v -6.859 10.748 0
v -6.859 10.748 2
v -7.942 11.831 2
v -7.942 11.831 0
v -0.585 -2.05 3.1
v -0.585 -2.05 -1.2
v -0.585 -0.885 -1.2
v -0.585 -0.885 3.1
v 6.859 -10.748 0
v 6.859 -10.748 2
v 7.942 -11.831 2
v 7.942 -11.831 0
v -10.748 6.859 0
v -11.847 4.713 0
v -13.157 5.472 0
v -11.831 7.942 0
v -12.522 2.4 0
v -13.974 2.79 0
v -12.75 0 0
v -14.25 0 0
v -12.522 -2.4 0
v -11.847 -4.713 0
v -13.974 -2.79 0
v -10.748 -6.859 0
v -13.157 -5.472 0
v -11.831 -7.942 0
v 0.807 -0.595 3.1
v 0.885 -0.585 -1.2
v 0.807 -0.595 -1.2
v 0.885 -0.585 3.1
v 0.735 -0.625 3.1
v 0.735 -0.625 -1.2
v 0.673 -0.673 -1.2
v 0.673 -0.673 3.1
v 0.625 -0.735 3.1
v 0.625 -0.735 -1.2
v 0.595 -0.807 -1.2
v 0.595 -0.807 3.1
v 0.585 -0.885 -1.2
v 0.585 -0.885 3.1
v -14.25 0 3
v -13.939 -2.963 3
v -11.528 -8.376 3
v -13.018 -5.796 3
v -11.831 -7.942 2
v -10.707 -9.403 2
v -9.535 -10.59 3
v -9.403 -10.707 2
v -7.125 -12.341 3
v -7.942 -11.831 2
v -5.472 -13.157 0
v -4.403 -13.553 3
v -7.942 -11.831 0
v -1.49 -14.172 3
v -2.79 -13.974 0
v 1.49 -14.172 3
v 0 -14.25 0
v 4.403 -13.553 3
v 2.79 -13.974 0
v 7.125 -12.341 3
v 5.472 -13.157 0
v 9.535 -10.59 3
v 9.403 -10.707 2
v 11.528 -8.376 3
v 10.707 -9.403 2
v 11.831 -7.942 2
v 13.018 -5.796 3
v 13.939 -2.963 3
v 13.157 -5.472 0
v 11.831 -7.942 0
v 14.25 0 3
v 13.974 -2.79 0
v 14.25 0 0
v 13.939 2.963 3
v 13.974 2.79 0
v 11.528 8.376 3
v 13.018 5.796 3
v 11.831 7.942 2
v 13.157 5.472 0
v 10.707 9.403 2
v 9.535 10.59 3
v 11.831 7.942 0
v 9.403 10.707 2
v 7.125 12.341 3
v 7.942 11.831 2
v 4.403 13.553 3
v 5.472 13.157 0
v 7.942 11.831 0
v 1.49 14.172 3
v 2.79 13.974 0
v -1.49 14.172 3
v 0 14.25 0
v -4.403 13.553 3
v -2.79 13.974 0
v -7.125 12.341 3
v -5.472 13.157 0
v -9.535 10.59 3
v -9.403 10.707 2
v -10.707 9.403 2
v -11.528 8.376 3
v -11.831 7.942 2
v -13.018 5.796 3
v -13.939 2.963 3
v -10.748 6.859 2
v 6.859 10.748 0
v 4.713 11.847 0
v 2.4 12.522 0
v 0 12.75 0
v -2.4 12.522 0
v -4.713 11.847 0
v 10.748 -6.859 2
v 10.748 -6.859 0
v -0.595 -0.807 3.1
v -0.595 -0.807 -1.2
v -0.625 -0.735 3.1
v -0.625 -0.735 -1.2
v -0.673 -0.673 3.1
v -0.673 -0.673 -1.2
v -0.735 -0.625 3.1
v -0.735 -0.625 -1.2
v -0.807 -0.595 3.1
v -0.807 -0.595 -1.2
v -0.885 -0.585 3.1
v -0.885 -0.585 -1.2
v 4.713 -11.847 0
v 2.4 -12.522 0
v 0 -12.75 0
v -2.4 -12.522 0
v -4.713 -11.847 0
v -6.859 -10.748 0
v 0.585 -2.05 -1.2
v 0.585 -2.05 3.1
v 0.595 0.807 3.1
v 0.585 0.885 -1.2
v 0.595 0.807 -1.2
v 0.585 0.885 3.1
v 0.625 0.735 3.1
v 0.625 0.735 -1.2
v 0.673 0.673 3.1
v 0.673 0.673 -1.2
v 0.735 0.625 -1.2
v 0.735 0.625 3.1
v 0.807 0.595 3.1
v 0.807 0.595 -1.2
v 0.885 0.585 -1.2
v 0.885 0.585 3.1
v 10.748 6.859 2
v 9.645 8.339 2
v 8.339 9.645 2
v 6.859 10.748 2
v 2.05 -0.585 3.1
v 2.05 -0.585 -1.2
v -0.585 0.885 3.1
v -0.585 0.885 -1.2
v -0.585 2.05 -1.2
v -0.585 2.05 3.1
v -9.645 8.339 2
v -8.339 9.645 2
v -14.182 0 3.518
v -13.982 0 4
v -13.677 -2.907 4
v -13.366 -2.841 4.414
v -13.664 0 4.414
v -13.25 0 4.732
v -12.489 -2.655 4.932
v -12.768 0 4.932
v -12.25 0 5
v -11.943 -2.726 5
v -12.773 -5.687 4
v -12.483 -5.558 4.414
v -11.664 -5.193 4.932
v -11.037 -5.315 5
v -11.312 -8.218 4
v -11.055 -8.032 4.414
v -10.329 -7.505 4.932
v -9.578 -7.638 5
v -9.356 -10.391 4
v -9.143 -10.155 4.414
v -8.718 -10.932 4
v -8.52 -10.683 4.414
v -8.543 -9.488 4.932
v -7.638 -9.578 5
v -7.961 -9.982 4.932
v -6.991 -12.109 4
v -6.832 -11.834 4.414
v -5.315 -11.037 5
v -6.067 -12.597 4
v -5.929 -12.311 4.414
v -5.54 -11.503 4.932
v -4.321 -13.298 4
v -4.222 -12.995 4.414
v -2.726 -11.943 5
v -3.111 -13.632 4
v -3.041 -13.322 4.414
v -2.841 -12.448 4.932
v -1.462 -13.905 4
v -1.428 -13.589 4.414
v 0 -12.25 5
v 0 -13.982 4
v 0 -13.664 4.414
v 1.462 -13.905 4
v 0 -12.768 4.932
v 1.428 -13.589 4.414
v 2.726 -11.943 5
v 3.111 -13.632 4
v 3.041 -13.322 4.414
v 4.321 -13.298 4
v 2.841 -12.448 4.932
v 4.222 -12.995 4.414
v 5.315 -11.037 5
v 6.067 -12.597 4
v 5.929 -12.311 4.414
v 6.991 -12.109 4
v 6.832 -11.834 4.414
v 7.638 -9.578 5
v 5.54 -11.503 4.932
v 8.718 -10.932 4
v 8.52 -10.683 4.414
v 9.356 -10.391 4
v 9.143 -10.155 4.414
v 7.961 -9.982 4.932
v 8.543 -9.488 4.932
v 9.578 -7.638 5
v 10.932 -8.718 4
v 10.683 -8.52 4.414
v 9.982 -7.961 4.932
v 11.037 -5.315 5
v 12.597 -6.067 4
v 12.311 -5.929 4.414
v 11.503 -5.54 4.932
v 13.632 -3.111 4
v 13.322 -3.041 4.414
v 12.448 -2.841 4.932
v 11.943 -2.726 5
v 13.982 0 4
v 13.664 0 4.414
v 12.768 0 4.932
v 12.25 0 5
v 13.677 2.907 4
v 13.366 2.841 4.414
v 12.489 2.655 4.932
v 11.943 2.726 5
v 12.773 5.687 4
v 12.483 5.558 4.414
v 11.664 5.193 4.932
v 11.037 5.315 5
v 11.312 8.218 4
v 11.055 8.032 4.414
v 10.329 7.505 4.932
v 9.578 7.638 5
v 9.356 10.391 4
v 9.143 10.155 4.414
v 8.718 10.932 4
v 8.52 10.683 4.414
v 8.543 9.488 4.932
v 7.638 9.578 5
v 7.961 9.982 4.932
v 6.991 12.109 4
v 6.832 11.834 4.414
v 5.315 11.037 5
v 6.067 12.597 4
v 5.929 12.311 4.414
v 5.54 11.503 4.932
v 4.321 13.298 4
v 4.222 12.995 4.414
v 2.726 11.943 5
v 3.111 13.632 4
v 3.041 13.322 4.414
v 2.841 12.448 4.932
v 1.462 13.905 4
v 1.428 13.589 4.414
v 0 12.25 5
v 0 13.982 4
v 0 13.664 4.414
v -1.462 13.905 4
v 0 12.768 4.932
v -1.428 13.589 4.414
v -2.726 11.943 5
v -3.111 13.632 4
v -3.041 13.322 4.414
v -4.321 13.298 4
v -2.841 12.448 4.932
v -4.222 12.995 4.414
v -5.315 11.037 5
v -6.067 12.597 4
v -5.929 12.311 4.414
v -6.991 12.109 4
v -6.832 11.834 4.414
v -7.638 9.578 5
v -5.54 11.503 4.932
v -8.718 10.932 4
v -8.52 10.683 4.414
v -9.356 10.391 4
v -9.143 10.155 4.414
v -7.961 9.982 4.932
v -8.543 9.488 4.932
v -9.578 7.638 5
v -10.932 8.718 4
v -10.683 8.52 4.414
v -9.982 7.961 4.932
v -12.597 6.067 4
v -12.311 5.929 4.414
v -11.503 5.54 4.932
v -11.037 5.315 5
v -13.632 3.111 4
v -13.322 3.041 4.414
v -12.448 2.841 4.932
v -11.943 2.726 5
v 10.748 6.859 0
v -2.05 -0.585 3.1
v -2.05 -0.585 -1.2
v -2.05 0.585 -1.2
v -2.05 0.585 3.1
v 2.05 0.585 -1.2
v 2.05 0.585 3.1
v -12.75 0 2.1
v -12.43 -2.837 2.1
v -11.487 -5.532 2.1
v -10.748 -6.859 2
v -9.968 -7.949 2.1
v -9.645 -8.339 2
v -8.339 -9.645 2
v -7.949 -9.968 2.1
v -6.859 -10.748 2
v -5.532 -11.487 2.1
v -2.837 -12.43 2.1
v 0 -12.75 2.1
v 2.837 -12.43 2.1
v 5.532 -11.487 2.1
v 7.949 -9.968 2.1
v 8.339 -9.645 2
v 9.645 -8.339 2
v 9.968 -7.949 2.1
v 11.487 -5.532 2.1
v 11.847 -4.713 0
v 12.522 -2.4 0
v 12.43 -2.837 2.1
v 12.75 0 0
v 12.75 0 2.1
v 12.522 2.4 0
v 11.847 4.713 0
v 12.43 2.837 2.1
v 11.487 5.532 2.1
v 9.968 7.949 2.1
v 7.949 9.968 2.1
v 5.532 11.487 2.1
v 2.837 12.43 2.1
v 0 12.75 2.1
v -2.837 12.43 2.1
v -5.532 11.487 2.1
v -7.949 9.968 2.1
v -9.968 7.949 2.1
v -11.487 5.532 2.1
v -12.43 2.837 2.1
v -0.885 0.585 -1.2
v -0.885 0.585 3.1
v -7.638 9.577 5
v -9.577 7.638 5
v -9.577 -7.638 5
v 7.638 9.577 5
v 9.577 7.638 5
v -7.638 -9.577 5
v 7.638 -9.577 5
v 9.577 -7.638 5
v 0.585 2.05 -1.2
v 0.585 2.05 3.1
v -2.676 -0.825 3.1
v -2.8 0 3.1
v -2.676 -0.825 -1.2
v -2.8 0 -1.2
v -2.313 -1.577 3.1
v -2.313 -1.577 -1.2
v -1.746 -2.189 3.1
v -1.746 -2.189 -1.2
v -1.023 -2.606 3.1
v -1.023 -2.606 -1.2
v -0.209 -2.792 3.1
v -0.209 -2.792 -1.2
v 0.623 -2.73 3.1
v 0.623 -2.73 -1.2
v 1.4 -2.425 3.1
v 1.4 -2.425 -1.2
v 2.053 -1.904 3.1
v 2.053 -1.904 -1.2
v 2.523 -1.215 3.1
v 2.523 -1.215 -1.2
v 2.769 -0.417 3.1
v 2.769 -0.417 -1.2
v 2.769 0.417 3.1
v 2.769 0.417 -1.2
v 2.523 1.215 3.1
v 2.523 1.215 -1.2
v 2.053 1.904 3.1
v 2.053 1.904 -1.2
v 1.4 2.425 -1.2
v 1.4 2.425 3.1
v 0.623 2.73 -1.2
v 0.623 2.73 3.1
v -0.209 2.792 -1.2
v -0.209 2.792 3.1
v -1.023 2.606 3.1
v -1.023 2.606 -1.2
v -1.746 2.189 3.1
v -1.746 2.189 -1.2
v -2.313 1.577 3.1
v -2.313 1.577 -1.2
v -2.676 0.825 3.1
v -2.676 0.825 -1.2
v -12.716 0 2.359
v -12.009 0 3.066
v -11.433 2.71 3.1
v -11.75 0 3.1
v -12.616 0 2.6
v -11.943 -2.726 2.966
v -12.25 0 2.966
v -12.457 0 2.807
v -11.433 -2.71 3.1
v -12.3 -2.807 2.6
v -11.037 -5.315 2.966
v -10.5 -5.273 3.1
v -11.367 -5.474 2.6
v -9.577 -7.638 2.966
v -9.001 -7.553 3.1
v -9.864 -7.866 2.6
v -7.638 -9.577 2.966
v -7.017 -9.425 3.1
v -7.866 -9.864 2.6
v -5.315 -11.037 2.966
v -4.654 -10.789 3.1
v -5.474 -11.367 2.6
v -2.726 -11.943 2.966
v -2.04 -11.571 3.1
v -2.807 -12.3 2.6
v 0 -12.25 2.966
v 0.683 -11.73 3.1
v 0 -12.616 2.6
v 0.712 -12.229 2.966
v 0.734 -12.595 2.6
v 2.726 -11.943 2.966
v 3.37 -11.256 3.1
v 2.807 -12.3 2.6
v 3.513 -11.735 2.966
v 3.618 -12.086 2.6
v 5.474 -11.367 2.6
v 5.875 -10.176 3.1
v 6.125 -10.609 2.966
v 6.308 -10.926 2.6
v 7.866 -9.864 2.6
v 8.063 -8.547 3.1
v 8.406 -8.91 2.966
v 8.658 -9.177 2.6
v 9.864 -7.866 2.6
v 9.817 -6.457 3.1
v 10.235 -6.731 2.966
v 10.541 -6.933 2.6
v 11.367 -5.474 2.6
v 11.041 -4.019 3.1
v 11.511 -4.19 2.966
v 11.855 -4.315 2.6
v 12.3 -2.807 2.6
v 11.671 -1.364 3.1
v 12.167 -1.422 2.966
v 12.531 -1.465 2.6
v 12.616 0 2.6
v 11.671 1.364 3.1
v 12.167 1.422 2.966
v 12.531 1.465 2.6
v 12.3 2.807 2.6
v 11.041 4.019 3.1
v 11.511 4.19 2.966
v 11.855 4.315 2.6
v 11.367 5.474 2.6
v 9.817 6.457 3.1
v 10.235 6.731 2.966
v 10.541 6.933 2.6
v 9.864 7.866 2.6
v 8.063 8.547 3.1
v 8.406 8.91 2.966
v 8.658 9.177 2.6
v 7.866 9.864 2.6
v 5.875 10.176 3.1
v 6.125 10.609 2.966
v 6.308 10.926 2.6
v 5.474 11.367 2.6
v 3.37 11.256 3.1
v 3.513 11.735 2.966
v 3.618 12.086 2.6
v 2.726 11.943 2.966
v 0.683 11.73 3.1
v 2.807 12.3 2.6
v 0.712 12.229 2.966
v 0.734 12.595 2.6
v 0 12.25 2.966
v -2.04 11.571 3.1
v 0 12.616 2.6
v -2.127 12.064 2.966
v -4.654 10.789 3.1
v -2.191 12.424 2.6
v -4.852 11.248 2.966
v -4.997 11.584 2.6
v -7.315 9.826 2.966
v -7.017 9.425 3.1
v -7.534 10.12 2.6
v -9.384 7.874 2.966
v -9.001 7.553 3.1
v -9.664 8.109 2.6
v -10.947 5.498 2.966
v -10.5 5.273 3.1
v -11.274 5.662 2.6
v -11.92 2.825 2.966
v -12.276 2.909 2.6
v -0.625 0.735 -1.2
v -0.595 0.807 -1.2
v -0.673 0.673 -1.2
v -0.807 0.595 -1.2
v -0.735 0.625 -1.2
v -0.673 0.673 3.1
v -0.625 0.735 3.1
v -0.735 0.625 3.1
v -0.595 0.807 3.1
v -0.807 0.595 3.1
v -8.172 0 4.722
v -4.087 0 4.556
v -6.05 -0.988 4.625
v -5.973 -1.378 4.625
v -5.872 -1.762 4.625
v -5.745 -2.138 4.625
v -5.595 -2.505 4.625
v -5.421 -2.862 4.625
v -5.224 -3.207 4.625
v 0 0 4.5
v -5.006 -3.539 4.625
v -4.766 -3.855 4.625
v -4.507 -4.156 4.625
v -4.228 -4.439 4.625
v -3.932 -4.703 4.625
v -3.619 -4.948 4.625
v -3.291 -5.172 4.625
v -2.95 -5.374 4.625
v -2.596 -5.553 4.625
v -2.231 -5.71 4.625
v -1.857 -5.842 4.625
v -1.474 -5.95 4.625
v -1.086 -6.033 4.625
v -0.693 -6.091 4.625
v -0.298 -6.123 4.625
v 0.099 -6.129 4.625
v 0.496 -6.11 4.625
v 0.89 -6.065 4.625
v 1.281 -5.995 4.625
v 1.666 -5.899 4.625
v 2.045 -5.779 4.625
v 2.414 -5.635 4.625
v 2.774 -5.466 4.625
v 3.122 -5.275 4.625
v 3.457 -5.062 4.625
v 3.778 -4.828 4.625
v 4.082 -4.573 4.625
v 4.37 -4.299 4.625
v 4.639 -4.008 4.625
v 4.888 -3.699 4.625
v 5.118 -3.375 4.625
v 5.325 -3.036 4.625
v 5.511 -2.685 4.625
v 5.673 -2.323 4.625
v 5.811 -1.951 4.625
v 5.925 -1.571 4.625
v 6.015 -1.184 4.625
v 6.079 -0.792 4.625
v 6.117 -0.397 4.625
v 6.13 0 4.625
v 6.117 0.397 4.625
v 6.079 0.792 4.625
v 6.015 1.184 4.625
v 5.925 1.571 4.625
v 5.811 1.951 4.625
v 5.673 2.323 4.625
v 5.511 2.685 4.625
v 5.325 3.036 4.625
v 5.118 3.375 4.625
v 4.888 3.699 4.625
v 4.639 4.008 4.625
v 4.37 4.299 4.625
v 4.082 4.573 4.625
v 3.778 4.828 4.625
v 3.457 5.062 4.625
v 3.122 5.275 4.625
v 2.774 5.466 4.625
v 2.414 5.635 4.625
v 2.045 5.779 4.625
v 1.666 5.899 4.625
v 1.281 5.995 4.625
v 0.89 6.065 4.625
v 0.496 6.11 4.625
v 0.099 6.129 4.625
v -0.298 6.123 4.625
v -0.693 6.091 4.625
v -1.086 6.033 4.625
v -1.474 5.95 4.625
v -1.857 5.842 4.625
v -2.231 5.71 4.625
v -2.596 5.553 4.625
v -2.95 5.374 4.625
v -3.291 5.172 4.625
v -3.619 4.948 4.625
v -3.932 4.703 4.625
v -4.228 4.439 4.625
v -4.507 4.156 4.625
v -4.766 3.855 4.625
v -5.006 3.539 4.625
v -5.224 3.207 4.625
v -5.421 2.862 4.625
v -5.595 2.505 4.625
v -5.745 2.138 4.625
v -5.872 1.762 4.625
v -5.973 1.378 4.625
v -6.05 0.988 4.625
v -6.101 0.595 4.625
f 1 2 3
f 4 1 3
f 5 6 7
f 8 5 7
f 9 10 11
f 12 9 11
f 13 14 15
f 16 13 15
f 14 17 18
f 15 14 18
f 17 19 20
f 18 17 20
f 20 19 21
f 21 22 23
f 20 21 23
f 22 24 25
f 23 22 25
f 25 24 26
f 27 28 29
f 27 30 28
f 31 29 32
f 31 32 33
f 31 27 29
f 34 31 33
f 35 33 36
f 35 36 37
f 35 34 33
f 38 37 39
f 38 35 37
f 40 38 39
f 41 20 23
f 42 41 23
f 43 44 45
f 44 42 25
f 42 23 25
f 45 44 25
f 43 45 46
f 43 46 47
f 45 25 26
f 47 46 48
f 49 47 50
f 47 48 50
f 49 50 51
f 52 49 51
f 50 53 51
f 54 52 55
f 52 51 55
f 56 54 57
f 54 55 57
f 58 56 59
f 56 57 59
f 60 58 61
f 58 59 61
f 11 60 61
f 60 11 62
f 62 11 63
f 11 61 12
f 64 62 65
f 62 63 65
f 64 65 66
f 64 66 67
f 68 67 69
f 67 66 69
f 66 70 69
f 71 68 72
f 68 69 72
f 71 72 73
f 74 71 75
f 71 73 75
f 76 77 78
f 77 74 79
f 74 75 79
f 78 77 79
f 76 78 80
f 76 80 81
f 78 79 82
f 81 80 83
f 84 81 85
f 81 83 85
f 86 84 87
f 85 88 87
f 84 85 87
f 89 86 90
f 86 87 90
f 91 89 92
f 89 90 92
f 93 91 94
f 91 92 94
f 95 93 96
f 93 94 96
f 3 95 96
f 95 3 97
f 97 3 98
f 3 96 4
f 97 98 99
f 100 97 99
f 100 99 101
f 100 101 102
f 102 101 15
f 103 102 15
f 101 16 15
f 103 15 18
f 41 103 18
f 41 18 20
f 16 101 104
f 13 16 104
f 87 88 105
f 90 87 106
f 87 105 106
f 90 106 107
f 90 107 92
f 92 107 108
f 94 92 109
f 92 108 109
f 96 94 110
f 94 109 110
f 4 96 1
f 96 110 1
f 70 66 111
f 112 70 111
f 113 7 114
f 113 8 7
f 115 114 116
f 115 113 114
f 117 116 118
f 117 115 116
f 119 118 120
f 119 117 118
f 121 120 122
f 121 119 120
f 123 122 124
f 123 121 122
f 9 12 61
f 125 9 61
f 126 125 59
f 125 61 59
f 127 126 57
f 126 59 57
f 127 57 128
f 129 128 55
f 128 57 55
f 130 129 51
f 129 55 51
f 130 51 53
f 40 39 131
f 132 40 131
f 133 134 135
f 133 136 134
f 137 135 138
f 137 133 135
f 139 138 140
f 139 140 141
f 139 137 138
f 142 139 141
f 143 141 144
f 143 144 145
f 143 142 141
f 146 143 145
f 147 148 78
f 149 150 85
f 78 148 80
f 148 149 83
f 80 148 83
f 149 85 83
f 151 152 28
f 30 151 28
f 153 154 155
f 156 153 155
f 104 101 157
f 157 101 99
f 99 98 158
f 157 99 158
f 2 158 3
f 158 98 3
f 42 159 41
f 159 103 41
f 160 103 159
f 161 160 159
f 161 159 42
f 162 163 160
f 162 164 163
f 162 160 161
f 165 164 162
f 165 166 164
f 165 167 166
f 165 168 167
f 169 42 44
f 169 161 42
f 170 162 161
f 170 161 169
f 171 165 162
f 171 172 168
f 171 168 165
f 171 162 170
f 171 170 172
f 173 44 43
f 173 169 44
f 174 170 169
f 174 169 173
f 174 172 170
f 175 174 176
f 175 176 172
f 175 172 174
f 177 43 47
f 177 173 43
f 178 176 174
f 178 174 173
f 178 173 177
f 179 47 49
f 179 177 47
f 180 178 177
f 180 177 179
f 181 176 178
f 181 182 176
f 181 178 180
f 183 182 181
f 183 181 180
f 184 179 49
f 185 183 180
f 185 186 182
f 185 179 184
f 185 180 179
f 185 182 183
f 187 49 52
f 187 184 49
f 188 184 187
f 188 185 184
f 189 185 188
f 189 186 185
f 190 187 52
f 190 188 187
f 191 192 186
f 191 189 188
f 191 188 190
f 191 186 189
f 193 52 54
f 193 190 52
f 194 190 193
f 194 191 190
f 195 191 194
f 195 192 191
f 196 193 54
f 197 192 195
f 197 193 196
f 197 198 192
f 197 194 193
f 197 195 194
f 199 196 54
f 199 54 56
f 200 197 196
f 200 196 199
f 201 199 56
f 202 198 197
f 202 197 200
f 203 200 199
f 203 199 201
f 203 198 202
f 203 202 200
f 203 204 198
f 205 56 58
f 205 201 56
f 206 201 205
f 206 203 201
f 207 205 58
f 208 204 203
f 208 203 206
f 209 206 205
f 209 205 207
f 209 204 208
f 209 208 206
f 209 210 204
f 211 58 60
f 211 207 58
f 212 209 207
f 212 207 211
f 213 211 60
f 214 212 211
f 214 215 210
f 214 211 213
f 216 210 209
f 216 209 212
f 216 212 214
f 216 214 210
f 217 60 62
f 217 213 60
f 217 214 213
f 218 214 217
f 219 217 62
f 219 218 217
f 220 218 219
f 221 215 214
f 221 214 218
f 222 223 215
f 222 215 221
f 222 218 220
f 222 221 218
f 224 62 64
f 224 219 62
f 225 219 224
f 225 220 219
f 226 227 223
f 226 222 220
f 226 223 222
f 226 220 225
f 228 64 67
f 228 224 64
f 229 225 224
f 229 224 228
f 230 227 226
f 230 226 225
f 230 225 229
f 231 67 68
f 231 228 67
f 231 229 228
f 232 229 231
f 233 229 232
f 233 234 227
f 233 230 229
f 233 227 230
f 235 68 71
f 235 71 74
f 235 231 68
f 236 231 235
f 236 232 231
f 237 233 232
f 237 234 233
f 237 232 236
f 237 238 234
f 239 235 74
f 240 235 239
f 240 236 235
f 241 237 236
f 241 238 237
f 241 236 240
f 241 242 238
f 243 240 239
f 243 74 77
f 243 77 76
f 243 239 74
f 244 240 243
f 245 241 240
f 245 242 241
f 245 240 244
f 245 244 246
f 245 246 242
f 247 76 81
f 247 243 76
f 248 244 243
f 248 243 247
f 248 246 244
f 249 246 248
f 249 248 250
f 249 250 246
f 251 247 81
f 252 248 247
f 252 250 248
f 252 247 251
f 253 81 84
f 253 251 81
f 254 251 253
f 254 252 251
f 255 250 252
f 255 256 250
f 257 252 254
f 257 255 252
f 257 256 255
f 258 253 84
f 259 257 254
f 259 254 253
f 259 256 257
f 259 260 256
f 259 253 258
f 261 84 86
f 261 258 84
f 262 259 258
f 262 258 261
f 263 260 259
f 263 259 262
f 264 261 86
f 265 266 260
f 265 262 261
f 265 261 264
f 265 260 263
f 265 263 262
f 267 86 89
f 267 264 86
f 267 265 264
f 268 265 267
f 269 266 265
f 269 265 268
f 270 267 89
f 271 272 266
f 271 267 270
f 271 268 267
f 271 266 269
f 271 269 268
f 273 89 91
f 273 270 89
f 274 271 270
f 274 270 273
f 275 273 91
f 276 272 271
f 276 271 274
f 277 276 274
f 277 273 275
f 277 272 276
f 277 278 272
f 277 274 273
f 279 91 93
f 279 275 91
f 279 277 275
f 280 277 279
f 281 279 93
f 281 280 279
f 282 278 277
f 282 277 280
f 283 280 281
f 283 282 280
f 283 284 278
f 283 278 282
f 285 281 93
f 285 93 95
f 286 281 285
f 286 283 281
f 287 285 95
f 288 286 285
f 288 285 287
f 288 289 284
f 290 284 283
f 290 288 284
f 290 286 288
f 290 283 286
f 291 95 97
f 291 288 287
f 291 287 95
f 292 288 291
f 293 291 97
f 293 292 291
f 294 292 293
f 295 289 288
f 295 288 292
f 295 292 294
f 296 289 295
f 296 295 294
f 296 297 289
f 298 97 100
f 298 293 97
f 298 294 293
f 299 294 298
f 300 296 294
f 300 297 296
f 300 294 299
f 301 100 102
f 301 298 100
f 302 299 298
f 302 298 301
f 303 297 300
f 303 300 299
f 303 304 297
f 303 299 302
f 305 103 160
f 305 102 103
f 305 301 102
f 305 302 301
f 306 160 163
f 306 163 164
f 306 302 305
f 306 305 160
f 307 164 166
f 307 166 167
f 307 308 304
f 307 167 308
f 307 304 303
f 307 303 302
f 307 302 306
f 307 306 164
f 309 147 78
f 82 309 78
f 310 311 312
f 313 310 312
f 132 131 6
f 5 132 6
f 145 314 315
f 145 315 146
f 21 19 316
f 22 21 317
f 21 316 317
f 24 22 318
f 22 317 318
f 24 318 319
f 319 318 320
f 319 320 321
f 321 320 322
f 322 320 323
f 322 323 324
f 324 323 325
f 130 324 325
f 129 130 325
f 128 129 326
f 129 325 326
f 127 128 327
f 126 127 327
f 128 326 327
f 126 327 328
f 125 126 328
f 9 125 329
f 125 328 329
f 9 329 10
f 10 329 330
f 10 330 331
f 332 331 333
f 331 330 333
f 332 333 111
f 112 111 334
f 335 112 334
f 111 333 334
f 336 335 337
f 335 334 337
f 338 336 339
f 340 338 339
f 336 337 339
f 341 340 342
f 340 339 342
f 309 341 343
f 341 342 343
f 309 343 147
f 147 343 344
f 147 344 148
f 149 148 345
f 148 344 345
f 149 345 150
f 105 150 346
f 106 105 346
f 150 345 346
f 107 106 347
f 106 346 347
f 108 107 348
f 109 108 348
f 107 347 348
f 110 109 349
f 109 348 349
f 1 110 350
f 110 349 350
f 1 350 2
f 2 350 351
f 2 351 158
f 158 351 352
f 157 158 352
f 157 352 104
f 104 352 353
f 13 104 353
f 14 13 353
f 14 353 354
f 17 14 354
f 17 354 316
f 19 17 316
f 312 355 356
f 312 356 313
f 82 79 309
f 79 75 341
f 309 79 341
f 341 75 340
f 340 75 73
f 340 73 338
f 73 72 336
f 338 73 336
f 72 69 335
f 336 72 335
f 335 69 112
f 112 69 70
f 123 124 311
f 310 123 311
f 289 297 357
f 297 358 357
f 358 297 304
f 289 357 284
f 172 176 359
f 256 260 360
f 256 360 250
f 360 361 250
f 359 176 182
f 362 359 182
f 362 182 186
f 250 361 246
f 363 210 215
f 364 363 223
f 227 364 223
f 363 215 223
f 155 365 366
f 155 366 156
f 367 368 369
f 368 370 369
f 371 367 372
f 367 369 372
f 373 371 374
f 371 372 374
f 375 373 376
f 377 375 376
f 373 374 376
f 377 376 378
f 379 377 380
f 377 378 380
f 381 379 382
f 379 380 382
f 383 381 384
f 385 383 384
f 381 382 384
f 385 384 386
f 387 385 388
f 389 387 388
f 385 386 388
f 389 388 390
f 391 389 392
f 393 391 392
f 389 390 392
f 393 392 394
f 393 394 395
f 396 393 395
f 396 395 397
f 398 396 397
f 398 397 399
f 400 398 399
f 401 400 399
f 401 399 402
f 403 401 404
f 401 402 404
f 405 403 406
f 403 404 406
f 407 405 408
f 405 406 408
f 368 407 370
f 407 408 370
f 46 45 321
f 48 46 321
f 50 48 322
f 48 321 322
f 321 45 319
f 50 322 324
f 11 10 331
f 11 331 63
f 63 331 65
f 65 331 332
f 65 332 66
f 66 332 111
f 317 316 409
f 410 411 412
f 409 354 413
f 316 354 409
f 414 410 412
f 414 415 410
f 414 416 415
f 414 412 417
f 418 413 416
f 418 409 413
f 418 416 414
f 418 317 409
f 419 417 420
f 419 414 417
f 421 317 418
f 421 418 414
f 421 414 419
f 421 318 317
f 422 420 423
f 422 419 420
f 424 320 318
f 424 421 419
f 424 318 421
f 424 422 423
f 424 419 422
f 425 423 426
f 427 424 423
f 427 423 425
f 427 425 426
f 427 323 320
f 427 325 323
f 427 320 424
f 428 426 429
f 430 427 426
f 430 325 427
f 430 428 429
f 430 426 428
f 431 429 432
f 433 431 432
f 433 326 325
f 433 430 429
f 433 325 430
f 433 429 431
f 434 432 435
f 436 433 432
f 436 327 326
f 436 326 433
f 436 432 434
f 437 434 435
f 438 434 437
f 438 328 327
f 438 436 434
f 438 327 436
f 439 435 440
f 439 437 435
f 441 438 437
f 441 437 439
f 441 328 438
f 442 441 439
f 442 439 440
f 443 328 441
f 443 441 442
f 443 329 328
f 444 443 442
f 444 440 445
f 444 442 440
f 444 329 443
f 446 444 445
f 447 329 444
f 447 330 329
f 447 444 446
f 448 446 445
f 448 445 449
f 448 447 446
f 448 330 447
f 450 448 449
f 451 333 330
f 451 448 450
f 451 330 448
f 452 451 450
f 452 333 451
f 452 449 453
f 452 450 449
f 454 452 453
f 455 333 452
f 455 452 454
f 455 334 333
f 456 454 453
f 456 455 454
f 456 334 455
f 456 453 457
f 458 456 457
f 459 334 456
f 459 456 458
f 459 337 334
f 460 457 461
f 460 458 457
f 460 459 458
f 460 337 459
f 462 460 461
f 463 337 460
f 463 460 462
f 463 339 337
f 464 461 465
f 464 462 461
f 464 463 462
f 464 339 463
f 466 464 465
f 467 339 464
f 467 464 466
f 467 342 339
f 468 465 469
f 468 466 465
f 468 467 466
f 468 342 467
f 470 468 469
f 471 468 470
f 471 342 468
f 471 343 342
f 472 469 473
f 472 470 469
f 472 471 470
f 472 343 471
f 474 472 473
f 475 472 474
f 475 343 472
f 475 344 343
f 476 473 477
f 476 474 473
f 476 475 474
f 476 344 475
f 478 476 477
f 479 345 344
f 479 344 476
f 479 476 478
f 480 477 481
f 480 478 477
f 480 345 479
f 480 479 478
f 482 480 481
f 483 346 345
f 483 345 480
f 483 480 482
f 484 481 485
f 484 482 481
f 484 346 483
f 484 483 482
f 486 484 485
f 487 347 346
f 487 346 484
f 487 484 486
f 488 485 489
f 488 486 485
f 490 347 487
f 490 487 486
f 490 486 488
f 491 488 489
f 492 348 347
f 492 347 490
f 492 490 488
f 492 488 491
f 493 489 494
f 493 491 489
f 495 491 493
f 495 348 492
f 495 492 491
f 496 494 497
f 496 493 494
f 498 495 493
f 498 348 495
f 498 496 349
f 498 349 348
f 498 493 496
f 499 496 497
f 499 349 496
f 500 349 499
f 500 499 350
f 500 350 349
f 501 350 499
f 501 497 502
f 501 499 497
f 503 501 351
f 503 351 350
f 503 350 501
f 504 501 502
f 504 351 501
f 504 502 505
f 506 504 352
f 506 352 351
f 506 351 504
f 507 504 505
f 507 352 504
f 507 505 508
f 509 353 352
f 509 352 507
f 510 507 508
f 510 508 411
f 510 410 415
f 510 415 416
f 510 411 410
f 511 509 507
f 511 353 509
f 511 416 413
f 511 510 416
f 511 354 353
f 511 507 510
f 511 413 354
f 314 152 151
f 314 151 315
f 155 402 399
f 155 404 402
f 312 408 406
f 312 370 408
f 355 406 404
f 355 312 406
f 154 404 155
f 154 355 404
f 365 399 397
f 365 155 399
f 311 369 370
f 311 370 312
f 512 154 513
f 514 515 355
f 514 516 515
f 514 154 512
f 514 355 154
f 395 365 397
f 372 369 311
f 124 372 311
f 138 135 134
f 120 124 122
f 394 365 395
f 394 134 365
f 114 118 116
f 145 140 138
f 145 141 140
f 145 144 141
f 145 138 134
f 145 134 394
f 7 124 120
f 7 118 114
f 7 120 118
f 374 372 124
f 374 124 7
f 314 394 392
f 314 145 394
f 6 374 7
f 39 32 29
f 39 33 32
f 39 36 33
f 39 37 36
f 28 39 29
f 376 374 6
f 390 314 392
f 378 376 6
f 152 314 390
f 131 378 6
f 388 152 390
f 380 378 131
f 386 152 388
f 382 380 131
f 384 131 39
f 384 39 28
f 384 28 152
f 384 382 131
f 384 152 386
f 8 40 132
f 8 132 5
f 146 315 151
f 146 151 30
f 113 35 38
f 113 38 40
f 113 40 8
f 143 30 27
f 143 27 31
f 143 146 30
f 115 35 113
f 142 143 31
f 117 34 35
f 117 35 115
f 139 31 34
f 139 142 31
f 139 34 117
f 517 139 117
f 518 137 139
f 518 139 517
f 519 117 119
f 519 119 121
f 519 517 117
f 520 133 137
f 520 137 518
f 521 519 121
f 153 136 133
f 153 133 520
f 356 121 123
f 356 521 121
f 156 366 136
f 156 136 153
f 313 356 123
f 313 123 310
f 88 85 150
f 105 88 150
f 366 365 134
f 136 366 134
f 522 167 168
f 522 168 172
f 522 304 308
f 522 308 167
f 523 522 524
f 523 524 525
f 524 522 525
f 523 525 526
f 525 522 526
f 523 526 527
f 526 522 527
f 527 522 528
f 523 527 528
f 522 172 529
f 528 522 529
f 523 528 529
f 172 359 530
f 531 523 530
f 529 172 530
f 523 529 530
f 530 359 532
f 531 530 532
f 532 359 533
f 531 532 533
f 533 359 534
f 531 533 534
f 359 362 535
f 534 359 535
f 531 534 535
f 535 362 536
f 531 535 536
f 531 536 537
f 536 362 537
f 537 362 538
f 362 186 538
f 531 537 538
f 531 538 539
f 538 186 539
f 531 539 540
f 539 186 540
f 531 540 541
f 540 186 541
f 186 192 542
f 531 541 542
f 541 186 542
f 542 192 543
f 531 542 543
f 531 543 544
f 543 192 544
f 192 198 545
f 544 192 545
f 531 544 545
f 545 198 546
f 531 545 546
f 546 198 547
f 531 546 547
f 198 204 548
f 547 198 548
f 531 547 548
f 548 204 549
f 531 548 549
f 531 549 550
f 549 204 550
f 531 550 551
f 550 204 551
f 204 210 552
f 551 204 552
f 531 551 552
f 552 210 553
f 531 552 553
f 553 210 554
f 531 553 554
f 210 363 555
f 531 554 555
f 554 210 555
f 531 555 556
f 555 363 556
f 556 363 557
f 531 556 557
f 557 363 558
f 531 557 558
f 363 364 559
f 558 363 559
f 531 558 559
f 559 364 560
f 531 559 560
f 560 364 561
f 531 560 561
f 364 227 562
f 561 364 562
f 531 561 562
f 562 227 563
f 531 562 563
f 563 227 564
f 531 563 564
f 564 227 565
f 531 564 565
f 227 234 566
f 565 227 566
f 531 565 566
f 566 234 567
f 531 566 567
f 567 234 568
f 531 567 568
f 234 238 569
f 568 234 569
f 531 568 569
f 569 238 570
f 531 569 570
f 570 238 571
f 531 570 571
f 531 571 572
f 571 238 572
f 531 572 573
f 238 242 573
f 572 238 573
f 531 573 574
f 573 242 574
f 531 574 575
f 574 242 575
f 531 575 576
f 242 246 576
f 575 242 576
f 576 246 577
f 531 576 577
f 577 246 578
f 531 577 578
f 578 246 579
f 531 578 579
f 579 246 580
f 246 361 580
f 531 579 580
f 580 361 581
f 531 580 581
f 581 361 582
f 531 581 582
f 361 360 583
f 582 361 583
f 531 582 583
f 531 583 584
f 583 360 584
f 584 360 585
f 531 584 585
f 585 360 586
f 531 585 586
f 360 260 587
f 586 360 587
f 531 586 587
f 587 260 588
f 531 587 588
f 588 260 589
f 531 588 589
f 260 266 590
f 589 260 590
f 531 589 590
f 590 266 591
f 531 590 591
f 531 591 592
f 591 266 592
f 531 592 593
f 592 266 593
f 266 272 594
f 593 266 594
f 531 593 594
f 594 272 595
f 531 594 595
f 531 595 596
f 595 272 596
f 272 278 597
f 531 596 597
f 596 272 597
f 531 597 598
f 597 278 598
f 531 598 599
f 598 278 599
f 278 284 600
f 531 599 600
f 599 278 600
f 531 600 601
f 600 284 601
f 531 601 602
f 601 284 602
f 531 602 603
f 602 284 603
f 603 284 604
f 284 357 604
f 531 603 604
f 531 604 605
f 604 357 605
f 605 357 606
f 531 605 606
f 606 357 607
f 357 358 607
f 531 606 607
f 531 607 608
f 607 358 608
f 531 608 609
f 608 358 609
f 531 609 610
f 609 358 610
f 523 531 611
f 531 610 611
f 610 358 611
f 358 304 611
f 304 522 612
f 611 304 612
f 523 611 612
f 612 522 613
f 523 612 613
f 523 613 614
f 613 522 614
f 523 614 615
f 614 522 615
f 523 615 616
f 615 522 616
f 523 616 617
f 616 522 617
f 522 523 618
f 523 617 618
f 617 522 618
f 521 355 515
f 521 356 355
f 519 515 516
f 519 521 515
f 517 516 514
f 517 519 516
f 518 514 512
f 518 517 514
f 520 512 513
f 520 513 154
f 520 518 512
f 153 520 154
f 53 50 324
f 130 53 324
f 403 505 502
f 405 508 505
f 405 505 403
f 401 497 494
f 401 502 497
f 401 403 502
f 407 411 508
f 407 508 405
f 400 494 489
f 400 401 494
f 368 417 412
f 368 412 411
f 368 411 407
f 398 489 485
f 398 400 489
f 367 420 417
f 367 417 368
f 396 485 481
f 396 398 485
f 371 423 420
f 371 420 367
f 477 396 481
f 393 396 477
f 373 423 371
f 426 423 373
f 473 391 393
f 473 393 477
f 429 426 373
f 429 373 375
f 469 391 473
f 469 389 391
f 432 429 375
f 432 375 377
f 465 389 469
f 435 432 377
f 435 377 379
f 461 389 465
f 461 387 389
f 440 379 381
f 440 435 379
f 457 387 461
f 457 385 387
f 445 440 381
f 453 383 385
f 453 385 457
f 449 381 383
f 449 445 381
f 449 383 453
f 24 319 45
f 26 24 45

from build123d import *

# Parameters (mm, degrees)
SKETCH1_W          = 9.95
SKETCH1_H          = 0.5
SKETCH1_W_2        = 2.8
SKETCH1_H_2        = 1.2
CUT_EXTRUDE2_START = 2
CUT_EXTRUDE2_DEPTH = 2
SKETCH3_W          = 1.17
SKETCH3_H          = 1.465
SKETCH3_H_2        = 1.17
SKETCH3_W_2        = 1.465
CUT_EXTRUDE3_DEPTH = 4.3
FILLET1_R          = 0.3
FILLET2_R          = 1
FILLET3_R          = 2


with BuildPart() as part:
    # Sketch1 → Revolve1 (revolve)
    with BuildSketch(Plane(origin=(0, 0, 0), x_dir=(1, 0, 0), z_dir=(0, 1, 0)), mode=Mode.PRIVATE) as revolve1_sk:
        with BuildLine():
            Line((2.8, 0), (0, 0))
            Line((0, 0), (0, -4.5))
            ThreePointArc((0, -4.5), (6.130099918, -4.625052018), (12.25, -5))
            Line((12.25, -5), (14.25, -5))
            Line((14.25, -5), (14.25, 0))
            Line((14.25, 0), (12.75, 0))
            Line((12.75, 0), (12.75, -3.1))
            Line((12.75, -3.1), (12.75, -3.6))
            Line((12.75, -3.6), (2.8, -3.6))
            Line((2.8, -3.6), (2.8, -3.1))
            Line((2.8, -3.1), (2.8, 0))
        make_face()
        with Locations((7.775, -3.35)):
            Rectangle(SKETCH1_W, SKETCH1_H)
        with Locations((1.4, 0.6)):
            Rectangle(SKETCH1_W_2, SKETCH1_H_2)
    revolve(revolve1_sk.sketch.rotate(Axis((0, 0, 0), (0, 0, 1)), 180), axis=Axis((0, 0, 0), (0, 0, 1)))

    # Sketch2 → Cut-Extrude2 (cut)
    with BuildSketch(Plane.XY.offset(CUT_EXTRUDE2_START)):
        with BuildLine():
            Line((10.747952079, 9.404591185), (9.404591185, 10.747952079))
            Line((9.404591185, 10.747952079), (6.858864783, 10.747952079))
            ThreePointArc((6.858864783, 10.747952079), (9.01561146, 9.01561146), (10.747952079, 6.858864783))
            Line((10.747952079, 6.858864783), (10.747952079, 9.404591185))
        make_face()
        Polygon((9.404591185, 10.747952079), (8.131727984, 12.02081528), (6.858864783, 10.747952079), align=None)
        Polygon((12.02081528, 8.131727984), (10.747952079, 9.404591185), (10.747952079, 6.858864783), align=None)
        Polygon((12.02081528, -8.131727984), (10.747952079, -6.858864783), (10.747952079, -9.404591185), align=None)
        with BuildLine():
            Line((10.747952079, -9.404591185), (10.747952079, -6.858864783))
            ThreePointArc((10.747952079, -6.858864783), (9.01561146, -9.01561146), (6.858864783, -10.747952079))
            Line((6.858864783, -10.747952079), (9.404591185, -10.747952079))
            Line((9.404591185, -10.747952079), (10.747952079, -9.404591185))
        make_face()
        Polygon((9.404591185, -10.747952079), (6.858864783, -10.747952079), (8.131727984, -12.02081528), align=None)
        Polygon((-8.131727984, -12.02081528), (-6.858864783, -10.747952079), (-9.404591185, -10.747952079), align=None)
        with BuildLine():
            ThreePointArc((-6.858864783, -10.747952079), (-9.01561146, -9.01561146), (-10.747952079, -6.858864783))
            Line((-10.747952079, -6.858864783), (-10.747952079, -9.404591185))
            Line((-10.747952079, -9.404591185), (-9.404591185, -10.747952079))
            Line((-9.404591185, -10.747952079), (-6.858864783, -10.747952079))
        make_face()
        Polygon((-10.747952079, -9.404591185), (-10.747952079, -6.858864783), (-12.02081528, -8.131727984), align=None)
        Polygon((-12.02081528, 8.131727984), (-10.747952079, 6.858864783), (-10.747952079, 9.404591185), align=None)
        with BuildLine():
            ThreePointArc((-10.747952079, 6.858864783), (-9.01561146, 9.01561146), (-6.858864783, 10.747952079))
            Line((-6.858864783, 10.747952079), (-9.404591185, 10.747952079))
            Line((-9.404591185, 10.747952079), (-10.747952079, 9.404591185))
            Line((-10.747952079, 9.404591185), (-10.747952079, 6.858864783))
        make_face()
        Polygon((-9.404591185, 10.747952079), (-6.858864783, 10.747952079), (-8.131727984, 12.02081528), align=None)
    extrude(amount=-CUT_EXTRUDE2_DEPTH, mode=Mode.SUBTRACT)

    # Sketch3 → Cut-Extrude3 (cut)
    with BuildSketch(Plane(origin=(0, 0, -1.2), x_dir=(-1, 0, 0), z_dir=(0, 0, -1))):
        with Locations((0, 1.3175)):
            Rectangle(SKETCH3_W, SKETCH3_H)
        Rectangle(SKETCH3_W, SKETCH3_H_2)
        with Locations((0, -1.3175)):
            Rectangle(SKETCH3_W, SKETCH3_H)
        with Locations((-1.3175, 0)):
            Rectangle(SKETCH3_W_2, SKETCH3_H_2)
        with Locations((1.3175, 0)):
            Rectangle(SKETCH3_W_2, SKETCH3_H_2)
    extrude(amount=-CUT_EXTRUDE3_DEPTH, mode=Mode.SUBTRACT)

    # Fillet1
    fillet1_edges = [part.edges().sort_by_distance(p)[0] for p in [
        (0.585, 0.585, 0.95),
        (0.585, -0.585, 0.95),
        (-0.585, -0.585, 0.95),
        (-0.585, 0.585, 0.95),
    ]]
    fillet(fillet1_edges, radius=FILLET1_R)

    # Fillet2
    fillet2_edges = [part.edges().sort_by_distance(p)[0] for p in [
        (12.75, 0, 3.1),
    ]]
    fillet(fillet2_edges, radius=FILLET2_R)

    # Fillet3
    fillet3_edges = [part.edges().sort_by_distance(p)[0] for p in [
        (14.25, 0, 5),
    ]]
    fillet(fillet3_edges, radius=FILLET3_R - 0.0001)  # a hair under: the kernel refuses the full size


solid = part.part
